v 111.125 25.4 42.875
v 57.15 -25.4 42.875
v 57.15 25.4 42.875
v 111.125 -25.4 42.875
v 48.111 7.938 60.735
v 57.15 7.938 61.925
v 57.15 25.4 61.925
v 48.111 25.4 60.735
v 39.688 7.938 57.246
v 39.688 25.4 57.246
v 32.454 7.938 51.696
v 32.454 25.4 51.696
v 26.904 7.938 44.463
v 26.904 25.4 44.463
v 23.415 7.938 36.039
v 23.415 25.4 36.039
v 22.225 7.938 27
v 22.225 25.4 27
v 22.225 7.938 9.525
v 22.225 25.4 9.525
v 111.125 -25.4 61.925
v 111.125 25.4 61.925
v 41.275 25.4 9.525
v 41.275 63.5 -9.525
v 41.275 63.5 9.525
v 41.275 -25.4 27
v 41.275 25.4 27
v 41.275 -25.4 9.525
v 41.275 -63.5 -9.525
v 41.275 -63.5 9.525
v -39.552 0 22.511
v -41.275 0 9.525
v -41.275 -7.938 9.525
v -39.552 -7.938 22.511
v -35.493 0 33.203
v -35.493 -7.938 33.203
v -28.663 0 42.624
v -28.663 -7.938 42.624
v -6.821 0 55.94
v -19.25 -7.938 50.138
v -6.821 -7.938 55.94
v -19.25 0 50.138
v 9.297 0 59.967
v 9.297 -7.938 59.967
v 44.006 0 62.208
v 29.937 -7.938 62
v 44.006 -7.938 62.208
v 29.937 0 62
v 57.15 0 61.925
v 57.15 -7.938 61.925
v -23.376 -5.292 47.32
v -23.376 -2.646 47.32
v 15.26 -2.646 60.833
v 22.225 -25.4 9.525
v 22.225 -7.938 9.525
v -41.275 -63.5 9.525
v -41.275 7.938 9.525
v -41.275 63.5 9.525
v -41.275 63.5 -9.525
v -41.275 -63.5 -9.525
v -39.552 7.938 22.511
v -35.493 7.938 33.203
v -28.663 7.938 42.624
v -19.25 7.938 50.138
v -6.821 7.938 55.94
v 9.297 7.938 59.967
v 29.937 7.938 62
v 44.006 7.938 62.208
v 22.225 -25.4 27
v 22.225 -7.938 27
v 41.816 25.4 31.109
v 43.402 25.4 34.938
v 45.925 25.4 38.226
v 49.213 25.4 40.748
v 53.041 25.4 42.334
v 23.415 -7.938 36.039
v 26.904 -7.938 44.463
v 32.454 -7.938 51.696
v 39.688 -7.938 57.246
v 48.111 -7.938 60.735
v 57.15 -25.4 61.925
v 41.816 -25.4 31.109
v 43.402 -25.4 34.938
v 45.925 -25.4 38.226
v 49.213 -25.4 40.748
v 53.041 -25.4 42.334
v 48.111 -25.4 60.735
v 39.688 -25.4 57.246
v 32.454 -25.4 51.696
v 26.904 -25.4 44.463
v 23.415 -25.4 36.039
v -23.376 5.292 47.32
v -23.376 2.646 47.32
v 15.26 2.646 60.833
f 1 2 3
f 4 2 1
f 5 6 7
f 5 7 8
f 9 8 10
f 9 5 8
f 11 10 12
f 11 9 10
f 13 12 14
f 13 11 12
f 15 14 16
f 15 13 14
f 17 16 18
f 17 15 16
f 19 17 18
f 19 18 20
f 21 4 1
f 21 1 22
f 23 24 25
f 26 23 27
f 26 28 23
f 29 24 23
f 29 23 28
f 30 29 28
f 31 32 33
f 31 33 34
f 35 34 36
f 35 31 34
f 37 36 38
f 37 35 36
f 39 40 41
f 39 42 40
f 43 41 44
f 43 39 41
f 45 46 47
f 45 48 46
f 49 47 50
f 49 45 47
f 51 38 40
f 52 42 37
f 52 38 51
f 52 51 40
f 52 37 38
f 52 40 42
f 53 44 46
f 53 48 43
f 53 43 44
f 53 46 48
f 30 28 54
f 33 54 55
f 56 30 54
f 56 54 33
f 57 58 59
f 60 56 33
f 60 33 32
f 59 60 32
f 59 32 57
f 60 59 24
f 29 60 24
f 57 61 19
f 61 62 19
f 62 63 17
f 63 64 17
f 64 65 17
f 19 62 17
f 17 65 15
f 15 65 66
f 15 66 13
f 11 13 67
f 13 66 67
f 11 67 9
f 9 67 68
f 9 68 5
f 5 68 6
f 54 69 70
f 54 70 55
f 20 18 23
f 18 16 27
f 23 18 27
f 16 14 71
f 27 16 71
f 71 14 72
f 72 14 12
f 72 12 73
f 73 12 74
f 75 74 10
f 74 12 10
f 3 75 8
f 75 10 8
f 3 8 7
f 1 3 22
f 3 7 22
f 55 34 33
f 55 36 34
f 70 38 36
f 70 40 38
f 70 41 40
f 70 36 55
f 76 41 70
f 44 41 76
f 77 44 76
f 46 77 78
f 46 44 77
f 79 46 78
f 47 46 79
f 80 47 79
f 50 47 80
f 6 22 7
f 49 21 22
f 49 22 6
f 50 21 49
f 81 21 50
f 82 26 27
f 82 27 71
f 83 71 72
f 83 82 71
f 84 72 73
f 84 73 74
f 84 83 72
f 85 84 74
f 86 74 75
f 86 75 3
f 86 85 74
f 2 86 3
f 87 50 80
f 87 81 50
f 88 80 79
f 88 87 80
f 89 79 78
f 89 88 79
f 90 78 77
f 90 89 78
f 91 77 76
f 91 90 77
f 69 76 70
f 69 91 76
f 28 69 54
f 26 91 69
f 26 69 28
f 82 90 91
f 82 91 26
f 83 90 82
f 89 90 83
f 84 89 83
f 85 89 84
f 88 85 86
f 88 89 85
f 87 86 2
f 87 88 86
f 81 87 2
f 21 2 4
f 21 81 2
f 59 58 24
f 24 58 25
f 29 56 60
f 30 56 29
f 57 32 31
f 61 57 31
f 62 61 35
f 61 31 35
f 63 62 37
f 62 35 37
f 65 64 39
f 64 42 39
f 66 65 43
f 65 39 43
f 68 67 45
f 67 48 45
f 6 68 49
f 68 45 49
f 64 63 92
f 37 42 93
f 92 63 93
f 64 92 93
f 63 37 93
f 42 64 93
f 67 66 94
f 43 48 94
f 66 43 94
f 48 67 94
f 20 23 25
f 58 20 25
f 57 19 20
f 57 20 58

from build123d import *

# Parameters (mm, degrees)
F1_DEPTH = 63.5
F0_W     = 50.8
F0_H     = 19.05
F2_DEPTH = 25.4
F3_DEPTH = 7.9375


with BuildPart() as f1:
    # F0 (on Front) → F1 (new body, symmetric)
    with BuildSketch(Plane.XZ):
        Polygon((41.275, -9.525), (41.275, 9.525), (22.225, 9.525), (-41.275, 9.525), (-41.275, -9.525), align=None)
    extrude(amount=F1_DEPTH, both=True)

    # F0 (on Front) → F2 (join, symmetric)
    with BuildSketch(Plane.XZ):
        with BuildLine():
            Line((22.225, 9.525), (41.275, 9.525))
            Line((41.275, 9.525), (41.275, 27.0002))
            ThreePointArc((41.275, 27.0002), (45.9246798487, 38.2255201513), (57.15, 42.8752))
            Line((57.15, 42.8752), (60.325, 42.8752))
            Line((60.325, 42.8752), (60.325, 61.9252))
            Line((60.325, 61.9252), (57.15, 61.9252))
            ThreePointArc((57.15, 61.9252), (32.4542956671, 51.6959043329), (22.225, 27.0002))
            Line((22.225, 27.0002), (22.225, 9.525))
        make_face()
        with Locations((85.725, 52.4002)):
            Rectangle(F0_W, F0_H)
    extrude(amount=F2_DEPTH, both=True)

    # F0 (on Front) → F3 (join, symmetric)
    with BuildSketch(Plane.XZ):
        with BuildLine():
            Line((-41.275, 9.525), (22.225, 9.525))
            Line((22.225, 9.525), (22.225, 27.0002))
            ThreePointArc((22.225, 27.0002), (32.4542956671, 51.6959043329), (57.15, 61.9252))
            add(Edge.make_bspline(
                [(-41.275, 9.525), (-39.5729020238, 63.4139552712), (19.462088123, 63.0895867944), (57.15, 61.9252)],
                knots=[0, 0, 0, 0, 111.5045361635, 111.5045361635, 111.5045361635, 111.5045361635], degree=3))
        make_face()
    extrude(amount=F3_DEPTH, both=True)


solid = f1.part
